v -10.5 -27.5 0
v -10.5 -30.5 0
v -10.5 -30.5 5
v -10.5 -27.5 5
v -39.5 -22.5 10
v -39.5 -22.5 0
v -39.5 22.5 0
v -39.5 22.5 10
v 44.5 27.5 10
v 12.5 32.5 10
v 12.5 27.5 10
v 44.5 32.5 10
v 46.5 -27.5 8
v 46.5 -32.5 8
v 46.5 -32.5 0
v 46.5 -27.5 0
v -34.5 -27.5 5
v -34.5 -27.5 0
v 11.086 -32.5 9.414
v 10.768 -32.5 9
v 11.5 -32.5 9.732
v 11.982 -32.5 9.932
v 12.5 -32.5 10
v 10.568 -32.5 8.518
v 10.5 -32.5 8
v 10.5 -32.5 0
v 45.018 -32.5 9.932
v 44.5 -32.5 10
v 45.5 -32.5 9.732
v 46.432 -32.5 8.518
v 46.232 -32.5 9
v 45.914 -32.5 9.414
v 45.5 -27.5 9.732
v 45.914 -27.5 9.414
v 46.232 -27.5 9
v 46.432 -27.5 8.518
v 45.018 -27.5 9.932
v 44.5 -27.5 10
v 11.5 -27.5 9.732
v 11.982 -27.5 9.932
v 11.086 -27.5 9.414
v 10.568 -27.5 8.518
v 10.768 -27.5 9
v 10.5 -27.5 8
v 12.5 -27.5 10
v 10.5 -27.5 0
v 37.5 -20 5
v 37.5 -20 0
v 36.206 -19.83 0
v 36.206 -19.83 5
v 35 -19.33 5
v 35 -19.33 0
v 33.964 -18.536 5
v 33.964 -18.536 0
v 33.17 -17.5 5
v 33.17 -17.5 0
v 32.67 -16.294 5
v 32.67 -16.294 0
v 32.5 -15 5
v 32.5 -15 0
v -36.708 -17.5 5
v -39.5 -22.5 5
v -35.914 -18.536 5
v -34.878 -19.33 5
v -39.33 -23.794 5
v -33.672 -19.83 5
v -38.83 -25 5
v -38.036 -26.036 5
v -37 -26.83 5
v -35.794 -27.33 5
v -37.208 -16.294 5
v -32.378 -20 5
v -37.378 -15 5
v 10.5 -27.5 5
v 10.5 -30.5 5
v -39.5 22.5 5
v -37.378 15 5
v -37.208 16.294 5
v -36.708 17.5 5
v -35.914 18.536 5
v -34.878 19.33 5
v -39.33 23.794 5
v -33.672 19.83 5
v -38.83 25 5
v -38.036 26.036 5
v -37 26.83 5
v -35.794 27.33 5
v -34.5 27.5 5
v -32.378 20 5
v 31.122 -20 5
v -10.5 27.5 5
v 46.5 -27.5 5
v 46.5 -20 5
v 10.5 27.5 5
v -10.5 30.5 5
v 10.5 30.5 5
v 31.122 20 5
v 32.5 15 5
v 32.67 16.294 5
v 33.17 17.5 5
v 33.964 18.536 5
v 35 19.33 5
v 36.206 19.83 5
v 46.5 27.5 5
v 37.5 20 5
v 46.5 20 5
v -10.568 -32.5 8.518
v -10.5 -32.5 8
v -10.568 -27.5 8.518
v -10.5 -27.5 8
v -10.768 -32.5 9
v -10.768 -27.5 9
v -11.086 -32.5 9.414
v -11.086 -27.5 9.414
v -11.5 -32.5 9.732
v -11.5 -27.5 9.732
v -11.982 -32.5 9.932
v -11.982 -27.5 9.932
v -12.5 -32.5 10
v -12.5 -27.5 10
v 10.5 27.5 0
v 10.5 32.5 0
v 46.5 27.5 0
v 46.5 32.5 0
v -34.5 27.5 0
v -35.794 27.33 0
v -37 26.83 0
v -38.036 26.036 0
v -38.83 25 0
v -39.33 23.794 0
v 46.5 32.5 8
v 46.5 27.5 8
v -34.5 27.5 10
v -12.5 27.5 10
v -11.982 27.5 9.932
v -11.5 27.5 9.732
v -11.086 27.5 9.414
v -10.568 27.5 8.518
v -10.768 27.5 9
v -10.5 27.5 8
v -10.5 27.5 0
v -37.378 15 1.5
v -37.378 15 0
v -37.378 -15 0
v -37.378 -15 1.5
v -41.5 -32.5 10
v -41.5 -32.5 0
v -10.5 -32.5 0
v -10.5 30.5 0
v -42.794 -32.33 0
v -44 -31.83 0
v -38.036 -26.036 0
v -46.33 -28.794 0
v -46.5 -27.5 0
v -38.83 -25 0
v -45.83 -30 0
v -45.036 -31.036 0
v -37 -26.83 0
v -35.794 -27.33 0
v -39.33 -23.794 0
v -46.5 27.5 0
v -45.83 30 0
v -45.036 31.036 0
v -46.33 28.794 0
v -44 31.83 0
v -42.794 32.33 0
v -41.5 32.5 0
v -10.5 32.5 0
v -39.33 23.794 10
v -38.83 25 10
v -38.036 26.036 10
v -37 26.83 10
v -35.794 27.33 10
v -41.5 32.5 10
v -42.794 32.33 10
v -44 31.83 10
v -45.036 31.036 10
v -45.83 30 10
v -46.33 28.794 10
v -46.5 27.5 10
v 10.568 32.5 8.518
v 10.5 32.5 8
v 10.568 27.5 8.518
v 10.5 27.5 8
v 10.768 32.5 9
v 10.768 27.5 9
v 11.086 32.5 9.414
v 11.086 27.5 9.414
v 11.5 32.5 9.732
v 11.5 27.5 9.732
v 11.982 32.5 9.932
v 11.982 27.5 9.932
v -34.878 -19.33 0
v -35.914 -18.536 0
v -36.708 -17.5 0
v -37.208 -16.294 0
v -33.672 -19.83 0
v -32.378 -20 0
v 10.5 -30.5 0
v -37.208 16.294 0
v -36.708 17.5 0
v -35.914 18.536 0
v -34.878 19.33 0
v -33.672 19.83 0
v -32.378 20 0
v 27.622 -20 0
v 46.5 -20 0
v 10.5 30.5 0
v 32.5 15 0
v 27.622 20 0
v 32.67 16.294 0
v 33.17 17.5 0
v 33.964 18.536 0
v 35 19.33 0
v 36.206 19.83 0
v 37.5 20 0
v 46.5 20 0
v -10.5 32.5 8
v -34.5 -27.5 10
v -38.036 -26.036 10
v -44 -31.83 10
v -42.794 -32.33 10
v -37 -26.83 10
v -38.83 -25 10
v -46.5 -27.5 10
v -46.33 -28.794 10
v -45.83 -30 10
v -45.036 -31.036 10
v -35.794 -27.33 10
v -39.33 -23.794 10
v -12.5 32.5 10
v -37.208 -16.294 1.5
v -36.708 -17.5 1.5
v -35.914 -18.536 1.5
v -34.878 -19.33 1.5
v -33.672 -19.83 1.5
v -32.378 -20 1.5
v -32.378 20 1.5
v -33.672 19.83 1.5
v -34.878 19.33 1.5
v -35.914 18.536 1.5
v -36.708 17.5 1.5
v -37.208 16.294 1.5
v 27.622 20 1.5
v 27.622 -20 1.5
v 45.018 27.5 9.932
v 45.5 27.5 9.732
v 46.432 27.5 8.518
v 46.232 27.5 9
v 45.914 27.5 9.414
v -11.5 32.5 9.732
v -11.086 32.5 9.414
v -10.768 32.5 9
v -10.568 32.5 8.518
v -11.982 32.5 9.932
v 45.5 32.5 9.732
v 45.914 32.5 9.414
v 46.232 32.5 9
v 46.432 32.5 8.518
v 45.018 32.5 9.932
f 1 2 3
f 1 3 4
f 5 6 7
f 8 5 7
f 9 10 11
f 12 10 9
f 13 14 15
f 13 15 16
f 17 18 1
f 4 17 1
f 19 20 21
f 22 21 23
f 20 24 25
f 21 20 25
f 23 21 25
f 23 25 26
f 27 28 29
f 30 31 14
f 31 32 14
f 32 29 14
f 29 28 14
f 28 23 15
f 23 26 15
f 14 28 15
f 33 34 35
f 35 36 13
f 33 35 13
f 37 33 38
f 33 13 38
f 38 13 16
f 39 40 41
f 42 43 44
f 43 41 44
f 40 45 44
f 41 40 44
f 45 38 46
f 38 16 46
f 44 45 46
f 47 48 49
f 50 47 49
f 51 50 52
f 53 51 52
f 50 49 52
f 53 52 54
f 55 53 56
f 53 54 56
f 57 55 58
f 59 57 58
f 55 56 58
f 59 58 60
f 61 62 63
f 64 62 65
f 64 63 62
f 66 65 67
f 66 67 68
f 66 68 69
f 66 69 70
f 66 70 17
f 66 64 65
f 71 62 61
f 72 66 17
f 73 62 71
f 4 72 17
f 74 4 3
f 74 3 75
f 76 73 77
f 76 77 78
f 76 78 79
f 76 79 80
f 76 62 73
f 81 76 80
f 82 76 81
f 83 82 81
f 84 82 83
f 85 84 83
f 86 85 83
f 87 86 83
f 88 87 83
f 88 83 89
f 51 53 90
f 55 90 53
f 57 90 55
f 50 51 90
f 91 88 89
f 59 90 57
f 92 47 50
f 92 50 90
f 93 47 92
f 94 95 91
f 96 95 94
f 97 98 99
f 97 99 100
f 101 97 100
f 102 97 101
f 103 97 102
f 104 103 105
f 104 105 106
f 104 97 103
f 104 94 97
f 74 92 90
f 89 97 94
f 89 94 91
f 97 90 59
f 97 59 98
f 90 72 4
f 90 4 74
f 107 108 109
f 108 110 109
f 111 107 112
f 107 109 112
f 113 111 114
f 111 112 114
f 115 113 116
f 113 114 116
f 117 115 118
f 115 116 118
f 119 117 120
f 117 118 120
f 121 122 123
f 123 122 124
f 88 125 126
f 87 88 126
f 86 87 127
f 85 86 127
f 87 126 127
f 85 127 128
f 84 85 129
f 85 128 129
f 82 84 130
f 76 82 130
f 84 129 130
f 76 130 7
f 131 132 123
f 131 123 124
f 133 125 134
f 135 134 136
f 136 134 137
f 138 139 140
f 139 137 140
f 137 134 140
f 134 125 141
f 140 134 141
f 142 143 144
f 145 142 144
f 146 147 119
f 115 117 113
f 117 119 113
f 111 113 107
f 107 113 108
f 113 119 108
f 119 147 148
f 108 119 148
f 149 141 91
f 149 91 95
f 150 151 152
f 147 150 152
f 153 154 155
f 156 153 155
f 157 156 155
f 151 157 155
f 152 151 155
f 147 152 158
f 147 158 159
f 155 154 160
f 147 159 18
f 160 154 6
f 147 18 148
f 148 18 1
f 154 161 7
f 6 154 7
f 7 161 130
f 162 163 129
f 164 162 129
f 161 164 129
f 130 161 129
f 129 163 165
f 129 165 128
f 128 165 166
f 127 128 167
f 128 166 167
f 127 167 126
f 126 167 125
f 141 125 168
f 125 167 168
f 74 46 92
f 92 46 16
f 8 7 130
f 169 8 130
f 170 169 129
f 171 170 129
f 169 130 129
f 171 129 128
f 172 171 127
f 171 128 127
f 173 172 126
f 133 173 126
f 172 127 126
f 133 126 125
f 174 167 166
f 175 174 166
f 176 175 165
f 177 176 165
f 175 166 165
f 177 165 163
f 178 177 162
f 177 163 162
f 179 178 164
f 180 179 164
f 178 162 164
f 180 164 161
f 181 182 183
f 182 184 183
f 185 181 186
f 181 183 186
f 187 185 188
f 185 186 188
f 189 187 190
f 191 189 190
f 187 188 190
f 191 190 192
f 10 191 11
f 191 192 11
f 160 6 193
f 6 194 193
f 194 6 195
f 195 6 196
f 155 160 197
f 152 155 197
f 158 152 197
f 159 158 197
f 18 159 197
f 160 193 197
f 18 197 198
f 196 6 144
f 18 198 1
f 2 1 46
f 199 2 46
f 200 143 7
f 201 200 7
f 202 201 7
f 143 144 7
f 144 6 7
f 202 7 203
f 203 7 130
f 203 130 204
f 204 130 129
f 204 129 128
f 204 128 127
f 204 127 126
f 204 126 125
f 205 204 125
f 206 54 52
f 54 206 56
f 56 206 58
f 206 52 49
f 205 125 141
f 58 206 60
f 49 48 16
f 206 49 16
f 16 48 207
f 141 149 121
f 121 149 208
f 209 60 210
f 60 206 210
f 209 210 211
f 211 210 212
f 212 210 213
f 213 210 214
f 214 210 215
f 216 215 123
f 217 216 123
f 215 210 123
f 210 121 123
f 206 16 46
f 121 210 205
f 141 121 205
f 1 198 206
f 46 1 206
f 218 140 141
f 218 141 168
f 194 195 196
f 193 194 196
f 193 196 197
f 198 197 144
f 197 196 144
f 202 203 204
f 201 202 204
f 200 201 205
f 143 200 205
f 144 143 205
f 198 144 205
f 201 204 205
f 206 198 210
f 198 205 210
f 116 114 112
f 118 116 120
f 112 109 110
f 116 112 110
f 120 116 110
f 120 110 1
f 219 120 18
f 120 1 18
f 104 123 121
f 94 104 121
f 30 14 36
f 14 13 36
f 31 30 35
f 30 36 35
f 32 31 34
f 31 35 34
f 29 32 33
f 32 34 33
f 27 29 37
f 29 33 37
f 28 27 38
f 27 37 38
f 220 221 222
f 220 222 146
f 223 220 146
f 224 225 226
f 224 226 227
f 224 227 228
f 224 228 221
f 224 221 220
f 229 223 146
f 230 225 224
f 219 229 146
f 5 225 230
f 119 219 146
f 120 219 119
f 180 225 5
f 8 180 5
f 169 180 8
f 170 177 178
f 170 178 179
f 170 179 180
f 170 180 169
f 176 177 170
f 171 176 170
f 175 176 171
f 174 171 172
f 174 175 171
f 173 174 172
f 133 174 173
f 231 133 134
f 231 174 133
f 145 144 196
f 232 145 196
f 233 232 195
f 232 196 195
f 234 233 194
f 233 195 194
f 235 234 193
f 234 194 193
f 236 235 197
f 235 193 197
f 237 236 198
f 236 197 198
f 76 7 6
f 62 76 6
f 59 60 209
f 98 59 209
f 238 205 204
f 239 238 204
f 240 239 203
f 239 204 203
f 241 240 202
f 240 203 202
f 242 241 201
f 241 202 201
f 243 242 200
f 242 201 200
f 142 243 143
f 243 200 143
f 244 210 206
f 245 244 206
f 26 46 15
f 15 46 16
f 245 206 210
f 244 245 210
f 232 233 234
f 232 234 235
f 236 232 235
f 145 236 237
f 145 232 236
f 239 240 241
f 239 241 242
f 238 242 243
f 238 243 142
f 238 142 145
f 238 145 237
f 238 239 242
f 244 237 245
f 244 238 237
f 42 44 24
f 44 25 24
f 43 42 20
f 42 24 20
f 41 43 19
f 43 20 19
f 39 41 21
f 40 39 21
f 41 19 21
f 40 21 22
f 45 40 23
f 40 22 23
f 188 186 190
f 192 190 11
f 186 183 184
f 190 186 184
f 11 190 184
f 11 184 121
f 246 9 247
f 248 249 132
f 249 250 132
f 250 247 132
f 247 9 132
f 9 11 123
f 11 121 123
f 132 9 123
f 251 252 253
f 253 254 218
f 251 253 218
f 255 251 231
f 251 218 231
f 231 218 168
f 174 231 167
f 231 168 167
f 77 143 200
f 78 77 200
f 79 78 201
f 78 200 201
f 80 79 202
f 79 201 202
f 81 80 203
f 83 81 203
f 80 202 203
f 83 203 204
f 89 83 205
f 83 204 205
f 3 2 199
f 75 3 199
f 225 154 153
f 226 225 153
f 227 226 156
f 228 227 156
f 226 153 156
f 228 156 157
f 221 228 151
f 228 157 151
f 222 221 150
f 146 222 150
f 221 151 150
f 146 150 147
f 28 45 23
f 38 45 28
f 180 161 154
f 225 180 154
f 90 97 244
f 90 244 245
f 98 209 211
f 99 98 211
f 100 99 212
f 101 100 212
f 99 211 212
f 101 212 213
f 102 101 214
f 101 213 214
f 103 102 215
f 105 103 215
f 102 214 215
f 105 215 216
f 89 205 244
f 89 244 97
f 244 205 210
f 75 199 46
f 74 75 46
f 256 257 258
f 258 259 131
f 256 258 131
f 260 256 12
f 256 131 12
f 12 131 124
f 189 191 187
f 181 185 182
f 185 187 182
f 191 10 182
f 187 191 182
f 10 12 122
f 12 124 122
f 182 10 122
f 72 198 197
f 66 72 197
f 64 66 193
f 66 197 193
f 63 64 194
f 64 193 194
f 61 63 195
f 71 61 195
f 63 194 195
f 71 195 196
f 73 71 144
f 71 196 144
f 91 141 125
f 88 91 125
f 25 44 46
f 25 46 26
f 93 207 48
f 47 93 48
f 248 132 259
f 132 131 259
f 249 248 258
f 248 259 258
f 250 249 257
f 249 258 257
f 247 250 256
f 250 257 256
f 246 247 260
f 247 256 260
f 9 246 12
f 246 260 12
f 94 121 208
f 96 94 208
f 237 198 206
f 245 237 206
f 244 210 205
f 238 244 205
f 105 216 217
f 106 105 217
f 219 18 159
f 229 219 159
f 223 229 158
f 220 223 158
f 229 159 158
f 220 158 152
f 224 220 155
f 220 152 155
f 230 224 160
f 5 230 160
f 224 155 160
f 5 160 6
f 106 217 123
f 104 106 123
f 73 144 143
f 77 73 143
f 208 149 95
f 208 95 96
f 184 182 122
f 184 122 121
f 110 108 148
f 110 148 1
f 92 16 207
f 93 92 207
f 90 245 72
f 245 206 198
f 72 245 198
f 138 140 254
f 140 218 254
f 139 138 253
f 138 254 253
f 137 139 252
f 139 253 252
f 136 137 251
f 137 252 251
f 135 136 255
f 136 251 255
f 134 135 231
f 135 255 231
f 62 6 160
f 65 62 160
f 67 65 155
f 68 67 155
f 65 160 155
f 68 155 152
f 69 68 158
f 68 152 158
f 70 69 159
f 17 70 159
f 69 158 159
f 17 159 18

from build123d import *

# Parameters (mm, degrees)
F0_W     = 21
F0_H     = 5
F0_H_2   = 3
F1_DEPTH = 5
F2_DEPTH = 1.5
F3_DEPTH = 10
F4_R     = 2
F4_2_R   = 2
F4_3_R   = 2
F5_SIZE  = 3.5


with BuildPart() as f1:
    # F0 (on Top) → F1 (new body)
    with BuildSketch(Plane.XY):
        with BuildLine():
            Line((10.5, -27.5), (46.5, -27.5))
            Line((46.5, -27.5), (46.5, -20))
            Line((46.5, -20), (37.5, -20))
            ThreePointArc((37.5, -20), (33.9644660941, -18.5355339059), (32.5, -15))
            Line((32.5, -15), (32.5, 15))
            ThreePointArc((32.5, 15), (33.9644660941, 18.5355339059), (37.5, 20))
            Line((37.5, 20), (46.5, 20))
            Line((46.5, 20), (46.5, 27.5))
            Line((46.5, 27.5), (10.5, 27.5))
            Line((10.5, 27.5), (-10.5, 27.5))
            Line((-10.5, 27.5), (-34.5, 27.5))
            ThreePointArc((-34.5, 27.5), (-38.0355339059, 26.0355339059), (-39.5, 22.5))
            Line((-39.5, 22.5), (-39.5, -22.5))
            ThreePointArc((-39.5, -22.5), (-38.0355339059, -26.0355339059), (-34.5, -27.5))
            Line((-34.5, -27.5), (-10.5, -27.5))
            Line((-10.5, -27.5), (-10.5, -22.5))
            Line((-10.5, -22.5), (10.5, -22.5))
            Line((10.5, -22.5), (10.5, -27.5))
        make_face()
        with BuildLine():
            Line((-32.3782377529, 20), (27.6217622471, 20))
            Line((27.6217622471, 20), (27.6217622471, -20))
            Line((27.6217622471, -20), (-32.3782377529, -20))
            ThreePointArc((-32.3782377529, -20), (-35.9137716589, -18.5355339059), (-37.3782377529, -15))
            Line((-37.3782377529, -15), (-37.3782377529, 15))
            ThreePointArc((-37.3782377529, 15), (-35.9137716589, 18.5355339059), (-32.3782377529, 20))
        make_face(mode=Mode.SUBTRACT)
        with Locations((0, -25)):
            Rectangle(F0_W, F0_H)
        with Locations((0, 29)):
            Rectangle(F0_W, F0_H_2)
        with Locations((0, -29)):
            Rectangle(F0_W, F0_H_2)
    extrude(amount=F1_DEPTH)

    # F5
    f5_edges = [f1.edges().sort_by_distance(p)[0] for p in [
        (27.621762, 0, 5),
    ]]
    chamfer(f5_edges, length=F5_SIZE)


with BuildPart() as f2:
    # F0 (on Top) → F2 (new body)
    with BuildSketch(Plane.XY):
        with BuildLine():
            Line((27.6217622471, -20), (27.6217622471, 20))
            Line((27.6217622471, 20), (-32.3782377529, 20))
            ThreePointArc((-32.3782377529, 20), (-35.9137716589, 18.5355339059), (-37.3782377529, 15))
            Line((-37.3782377529, 15), (-37.3782377529, -15))
            ThreePointArc((-37.3782377529, -15), (-35.9137716589, -18.5355339059), (-32.3782377529, -20))
            Line((-32.3782377529, -20), (27.6217622471, -20))
        make_face()
    extrude(amount=F2_DEPTH)


with BuildPart() as f3:
    # F0 (on Top) → F3 (new body)
    with BuildSketch(Plane.XY):
        Polygon((10.5, -32.5), (46.5, -32.5), (46.5, -27.5), (10.5, -27.5), (10.5, -30.5), align=None)
    extrude(amount=F3_DEPTH)

    # F4#2
    f4_2_edges = [f3.edges().sort_by_distance(p)[0] for p in [
        (46.5, -30, 10),
        (10.5, -30, 10),
    ]]
    fillet(f4_2_edges, radius=F4_2_R)


with BuildPart() as f3b:
    # F0 (on Top) → F3, piece 2 (new body)
    with BuildSketch(Plane.XY):
        with BuildLine():
            Line((-41.5, -32.5), (-10.5, -32.5))
            Line((-10.5, -32.5), (-10.5, -30.5))
            Line((-10.5, -30.5), (-10.5, -27.5))
            Line((-10.5, -27.5), (-34.5, -27.5))
            ThreePointArc((-34.5, -27.5), (-38.0355339059, -26.0355339059), (-39.5, -22.5))
            Line((-39.5, -22.5), (-39.5, 22.5))
            ThreePointArc((-39.5, 22.5), (-38.0355339059, 26.0355339059), (-34.5, 27.5))
            Line((-34.5, 27.5), (-10.5, 27.5))
            Line((-10.5, 27.5), (-10.5, 30.5))
            Line((-10.5, 30.5), (-10.5, 32.5))
            Line((-10.5, 32.5), (-41.5, 32.5))
            ThreePointArc((-41.5, 32.5), (-45.0355339059, 31.0355339059), (-46.5, 27.5))
            Line((-46.5, 27.5), (-46.5, -27.5))
            ThreePointArc((-46.5, -27.5), (-45.0355339059, -31.0355339059), (-41.5, -32.5))
        make_face()
    extrude(amount=F3_DEPTH)

    # F4#3
    f4_3_edges = [f3b.edges().sort_by_distance(p)[0] for p in [
        (-10.5, -30, 10),
        (-10.5, 30, 10),
    ]]
    fillet(f4_3_edges, radius=F4_3_R)


with BuildPart() as f3c:
    # F0 (on Top) → F3, piece 3 (new body)
    with BuildSketch(Plane.XY):
        Polygon((10.5, 27.5), (46.5, 27.5), (46.5, 32.5), (10.5, 32.5), (10.5, 30.5), align=None)
    extrude(amount=F3_DEPTH)

    # F4
    f4_edges = [f3c.edges().sort_by_distance(p)[0] for p in [
        (46.5, 30, 10),
        (10.5, 30, 10),
    ]]
    fillet(f4_edges, radius=F4_R)


solid = Compound([f1.part, f2.part, f3.part, f3b.part, f3c.part])
